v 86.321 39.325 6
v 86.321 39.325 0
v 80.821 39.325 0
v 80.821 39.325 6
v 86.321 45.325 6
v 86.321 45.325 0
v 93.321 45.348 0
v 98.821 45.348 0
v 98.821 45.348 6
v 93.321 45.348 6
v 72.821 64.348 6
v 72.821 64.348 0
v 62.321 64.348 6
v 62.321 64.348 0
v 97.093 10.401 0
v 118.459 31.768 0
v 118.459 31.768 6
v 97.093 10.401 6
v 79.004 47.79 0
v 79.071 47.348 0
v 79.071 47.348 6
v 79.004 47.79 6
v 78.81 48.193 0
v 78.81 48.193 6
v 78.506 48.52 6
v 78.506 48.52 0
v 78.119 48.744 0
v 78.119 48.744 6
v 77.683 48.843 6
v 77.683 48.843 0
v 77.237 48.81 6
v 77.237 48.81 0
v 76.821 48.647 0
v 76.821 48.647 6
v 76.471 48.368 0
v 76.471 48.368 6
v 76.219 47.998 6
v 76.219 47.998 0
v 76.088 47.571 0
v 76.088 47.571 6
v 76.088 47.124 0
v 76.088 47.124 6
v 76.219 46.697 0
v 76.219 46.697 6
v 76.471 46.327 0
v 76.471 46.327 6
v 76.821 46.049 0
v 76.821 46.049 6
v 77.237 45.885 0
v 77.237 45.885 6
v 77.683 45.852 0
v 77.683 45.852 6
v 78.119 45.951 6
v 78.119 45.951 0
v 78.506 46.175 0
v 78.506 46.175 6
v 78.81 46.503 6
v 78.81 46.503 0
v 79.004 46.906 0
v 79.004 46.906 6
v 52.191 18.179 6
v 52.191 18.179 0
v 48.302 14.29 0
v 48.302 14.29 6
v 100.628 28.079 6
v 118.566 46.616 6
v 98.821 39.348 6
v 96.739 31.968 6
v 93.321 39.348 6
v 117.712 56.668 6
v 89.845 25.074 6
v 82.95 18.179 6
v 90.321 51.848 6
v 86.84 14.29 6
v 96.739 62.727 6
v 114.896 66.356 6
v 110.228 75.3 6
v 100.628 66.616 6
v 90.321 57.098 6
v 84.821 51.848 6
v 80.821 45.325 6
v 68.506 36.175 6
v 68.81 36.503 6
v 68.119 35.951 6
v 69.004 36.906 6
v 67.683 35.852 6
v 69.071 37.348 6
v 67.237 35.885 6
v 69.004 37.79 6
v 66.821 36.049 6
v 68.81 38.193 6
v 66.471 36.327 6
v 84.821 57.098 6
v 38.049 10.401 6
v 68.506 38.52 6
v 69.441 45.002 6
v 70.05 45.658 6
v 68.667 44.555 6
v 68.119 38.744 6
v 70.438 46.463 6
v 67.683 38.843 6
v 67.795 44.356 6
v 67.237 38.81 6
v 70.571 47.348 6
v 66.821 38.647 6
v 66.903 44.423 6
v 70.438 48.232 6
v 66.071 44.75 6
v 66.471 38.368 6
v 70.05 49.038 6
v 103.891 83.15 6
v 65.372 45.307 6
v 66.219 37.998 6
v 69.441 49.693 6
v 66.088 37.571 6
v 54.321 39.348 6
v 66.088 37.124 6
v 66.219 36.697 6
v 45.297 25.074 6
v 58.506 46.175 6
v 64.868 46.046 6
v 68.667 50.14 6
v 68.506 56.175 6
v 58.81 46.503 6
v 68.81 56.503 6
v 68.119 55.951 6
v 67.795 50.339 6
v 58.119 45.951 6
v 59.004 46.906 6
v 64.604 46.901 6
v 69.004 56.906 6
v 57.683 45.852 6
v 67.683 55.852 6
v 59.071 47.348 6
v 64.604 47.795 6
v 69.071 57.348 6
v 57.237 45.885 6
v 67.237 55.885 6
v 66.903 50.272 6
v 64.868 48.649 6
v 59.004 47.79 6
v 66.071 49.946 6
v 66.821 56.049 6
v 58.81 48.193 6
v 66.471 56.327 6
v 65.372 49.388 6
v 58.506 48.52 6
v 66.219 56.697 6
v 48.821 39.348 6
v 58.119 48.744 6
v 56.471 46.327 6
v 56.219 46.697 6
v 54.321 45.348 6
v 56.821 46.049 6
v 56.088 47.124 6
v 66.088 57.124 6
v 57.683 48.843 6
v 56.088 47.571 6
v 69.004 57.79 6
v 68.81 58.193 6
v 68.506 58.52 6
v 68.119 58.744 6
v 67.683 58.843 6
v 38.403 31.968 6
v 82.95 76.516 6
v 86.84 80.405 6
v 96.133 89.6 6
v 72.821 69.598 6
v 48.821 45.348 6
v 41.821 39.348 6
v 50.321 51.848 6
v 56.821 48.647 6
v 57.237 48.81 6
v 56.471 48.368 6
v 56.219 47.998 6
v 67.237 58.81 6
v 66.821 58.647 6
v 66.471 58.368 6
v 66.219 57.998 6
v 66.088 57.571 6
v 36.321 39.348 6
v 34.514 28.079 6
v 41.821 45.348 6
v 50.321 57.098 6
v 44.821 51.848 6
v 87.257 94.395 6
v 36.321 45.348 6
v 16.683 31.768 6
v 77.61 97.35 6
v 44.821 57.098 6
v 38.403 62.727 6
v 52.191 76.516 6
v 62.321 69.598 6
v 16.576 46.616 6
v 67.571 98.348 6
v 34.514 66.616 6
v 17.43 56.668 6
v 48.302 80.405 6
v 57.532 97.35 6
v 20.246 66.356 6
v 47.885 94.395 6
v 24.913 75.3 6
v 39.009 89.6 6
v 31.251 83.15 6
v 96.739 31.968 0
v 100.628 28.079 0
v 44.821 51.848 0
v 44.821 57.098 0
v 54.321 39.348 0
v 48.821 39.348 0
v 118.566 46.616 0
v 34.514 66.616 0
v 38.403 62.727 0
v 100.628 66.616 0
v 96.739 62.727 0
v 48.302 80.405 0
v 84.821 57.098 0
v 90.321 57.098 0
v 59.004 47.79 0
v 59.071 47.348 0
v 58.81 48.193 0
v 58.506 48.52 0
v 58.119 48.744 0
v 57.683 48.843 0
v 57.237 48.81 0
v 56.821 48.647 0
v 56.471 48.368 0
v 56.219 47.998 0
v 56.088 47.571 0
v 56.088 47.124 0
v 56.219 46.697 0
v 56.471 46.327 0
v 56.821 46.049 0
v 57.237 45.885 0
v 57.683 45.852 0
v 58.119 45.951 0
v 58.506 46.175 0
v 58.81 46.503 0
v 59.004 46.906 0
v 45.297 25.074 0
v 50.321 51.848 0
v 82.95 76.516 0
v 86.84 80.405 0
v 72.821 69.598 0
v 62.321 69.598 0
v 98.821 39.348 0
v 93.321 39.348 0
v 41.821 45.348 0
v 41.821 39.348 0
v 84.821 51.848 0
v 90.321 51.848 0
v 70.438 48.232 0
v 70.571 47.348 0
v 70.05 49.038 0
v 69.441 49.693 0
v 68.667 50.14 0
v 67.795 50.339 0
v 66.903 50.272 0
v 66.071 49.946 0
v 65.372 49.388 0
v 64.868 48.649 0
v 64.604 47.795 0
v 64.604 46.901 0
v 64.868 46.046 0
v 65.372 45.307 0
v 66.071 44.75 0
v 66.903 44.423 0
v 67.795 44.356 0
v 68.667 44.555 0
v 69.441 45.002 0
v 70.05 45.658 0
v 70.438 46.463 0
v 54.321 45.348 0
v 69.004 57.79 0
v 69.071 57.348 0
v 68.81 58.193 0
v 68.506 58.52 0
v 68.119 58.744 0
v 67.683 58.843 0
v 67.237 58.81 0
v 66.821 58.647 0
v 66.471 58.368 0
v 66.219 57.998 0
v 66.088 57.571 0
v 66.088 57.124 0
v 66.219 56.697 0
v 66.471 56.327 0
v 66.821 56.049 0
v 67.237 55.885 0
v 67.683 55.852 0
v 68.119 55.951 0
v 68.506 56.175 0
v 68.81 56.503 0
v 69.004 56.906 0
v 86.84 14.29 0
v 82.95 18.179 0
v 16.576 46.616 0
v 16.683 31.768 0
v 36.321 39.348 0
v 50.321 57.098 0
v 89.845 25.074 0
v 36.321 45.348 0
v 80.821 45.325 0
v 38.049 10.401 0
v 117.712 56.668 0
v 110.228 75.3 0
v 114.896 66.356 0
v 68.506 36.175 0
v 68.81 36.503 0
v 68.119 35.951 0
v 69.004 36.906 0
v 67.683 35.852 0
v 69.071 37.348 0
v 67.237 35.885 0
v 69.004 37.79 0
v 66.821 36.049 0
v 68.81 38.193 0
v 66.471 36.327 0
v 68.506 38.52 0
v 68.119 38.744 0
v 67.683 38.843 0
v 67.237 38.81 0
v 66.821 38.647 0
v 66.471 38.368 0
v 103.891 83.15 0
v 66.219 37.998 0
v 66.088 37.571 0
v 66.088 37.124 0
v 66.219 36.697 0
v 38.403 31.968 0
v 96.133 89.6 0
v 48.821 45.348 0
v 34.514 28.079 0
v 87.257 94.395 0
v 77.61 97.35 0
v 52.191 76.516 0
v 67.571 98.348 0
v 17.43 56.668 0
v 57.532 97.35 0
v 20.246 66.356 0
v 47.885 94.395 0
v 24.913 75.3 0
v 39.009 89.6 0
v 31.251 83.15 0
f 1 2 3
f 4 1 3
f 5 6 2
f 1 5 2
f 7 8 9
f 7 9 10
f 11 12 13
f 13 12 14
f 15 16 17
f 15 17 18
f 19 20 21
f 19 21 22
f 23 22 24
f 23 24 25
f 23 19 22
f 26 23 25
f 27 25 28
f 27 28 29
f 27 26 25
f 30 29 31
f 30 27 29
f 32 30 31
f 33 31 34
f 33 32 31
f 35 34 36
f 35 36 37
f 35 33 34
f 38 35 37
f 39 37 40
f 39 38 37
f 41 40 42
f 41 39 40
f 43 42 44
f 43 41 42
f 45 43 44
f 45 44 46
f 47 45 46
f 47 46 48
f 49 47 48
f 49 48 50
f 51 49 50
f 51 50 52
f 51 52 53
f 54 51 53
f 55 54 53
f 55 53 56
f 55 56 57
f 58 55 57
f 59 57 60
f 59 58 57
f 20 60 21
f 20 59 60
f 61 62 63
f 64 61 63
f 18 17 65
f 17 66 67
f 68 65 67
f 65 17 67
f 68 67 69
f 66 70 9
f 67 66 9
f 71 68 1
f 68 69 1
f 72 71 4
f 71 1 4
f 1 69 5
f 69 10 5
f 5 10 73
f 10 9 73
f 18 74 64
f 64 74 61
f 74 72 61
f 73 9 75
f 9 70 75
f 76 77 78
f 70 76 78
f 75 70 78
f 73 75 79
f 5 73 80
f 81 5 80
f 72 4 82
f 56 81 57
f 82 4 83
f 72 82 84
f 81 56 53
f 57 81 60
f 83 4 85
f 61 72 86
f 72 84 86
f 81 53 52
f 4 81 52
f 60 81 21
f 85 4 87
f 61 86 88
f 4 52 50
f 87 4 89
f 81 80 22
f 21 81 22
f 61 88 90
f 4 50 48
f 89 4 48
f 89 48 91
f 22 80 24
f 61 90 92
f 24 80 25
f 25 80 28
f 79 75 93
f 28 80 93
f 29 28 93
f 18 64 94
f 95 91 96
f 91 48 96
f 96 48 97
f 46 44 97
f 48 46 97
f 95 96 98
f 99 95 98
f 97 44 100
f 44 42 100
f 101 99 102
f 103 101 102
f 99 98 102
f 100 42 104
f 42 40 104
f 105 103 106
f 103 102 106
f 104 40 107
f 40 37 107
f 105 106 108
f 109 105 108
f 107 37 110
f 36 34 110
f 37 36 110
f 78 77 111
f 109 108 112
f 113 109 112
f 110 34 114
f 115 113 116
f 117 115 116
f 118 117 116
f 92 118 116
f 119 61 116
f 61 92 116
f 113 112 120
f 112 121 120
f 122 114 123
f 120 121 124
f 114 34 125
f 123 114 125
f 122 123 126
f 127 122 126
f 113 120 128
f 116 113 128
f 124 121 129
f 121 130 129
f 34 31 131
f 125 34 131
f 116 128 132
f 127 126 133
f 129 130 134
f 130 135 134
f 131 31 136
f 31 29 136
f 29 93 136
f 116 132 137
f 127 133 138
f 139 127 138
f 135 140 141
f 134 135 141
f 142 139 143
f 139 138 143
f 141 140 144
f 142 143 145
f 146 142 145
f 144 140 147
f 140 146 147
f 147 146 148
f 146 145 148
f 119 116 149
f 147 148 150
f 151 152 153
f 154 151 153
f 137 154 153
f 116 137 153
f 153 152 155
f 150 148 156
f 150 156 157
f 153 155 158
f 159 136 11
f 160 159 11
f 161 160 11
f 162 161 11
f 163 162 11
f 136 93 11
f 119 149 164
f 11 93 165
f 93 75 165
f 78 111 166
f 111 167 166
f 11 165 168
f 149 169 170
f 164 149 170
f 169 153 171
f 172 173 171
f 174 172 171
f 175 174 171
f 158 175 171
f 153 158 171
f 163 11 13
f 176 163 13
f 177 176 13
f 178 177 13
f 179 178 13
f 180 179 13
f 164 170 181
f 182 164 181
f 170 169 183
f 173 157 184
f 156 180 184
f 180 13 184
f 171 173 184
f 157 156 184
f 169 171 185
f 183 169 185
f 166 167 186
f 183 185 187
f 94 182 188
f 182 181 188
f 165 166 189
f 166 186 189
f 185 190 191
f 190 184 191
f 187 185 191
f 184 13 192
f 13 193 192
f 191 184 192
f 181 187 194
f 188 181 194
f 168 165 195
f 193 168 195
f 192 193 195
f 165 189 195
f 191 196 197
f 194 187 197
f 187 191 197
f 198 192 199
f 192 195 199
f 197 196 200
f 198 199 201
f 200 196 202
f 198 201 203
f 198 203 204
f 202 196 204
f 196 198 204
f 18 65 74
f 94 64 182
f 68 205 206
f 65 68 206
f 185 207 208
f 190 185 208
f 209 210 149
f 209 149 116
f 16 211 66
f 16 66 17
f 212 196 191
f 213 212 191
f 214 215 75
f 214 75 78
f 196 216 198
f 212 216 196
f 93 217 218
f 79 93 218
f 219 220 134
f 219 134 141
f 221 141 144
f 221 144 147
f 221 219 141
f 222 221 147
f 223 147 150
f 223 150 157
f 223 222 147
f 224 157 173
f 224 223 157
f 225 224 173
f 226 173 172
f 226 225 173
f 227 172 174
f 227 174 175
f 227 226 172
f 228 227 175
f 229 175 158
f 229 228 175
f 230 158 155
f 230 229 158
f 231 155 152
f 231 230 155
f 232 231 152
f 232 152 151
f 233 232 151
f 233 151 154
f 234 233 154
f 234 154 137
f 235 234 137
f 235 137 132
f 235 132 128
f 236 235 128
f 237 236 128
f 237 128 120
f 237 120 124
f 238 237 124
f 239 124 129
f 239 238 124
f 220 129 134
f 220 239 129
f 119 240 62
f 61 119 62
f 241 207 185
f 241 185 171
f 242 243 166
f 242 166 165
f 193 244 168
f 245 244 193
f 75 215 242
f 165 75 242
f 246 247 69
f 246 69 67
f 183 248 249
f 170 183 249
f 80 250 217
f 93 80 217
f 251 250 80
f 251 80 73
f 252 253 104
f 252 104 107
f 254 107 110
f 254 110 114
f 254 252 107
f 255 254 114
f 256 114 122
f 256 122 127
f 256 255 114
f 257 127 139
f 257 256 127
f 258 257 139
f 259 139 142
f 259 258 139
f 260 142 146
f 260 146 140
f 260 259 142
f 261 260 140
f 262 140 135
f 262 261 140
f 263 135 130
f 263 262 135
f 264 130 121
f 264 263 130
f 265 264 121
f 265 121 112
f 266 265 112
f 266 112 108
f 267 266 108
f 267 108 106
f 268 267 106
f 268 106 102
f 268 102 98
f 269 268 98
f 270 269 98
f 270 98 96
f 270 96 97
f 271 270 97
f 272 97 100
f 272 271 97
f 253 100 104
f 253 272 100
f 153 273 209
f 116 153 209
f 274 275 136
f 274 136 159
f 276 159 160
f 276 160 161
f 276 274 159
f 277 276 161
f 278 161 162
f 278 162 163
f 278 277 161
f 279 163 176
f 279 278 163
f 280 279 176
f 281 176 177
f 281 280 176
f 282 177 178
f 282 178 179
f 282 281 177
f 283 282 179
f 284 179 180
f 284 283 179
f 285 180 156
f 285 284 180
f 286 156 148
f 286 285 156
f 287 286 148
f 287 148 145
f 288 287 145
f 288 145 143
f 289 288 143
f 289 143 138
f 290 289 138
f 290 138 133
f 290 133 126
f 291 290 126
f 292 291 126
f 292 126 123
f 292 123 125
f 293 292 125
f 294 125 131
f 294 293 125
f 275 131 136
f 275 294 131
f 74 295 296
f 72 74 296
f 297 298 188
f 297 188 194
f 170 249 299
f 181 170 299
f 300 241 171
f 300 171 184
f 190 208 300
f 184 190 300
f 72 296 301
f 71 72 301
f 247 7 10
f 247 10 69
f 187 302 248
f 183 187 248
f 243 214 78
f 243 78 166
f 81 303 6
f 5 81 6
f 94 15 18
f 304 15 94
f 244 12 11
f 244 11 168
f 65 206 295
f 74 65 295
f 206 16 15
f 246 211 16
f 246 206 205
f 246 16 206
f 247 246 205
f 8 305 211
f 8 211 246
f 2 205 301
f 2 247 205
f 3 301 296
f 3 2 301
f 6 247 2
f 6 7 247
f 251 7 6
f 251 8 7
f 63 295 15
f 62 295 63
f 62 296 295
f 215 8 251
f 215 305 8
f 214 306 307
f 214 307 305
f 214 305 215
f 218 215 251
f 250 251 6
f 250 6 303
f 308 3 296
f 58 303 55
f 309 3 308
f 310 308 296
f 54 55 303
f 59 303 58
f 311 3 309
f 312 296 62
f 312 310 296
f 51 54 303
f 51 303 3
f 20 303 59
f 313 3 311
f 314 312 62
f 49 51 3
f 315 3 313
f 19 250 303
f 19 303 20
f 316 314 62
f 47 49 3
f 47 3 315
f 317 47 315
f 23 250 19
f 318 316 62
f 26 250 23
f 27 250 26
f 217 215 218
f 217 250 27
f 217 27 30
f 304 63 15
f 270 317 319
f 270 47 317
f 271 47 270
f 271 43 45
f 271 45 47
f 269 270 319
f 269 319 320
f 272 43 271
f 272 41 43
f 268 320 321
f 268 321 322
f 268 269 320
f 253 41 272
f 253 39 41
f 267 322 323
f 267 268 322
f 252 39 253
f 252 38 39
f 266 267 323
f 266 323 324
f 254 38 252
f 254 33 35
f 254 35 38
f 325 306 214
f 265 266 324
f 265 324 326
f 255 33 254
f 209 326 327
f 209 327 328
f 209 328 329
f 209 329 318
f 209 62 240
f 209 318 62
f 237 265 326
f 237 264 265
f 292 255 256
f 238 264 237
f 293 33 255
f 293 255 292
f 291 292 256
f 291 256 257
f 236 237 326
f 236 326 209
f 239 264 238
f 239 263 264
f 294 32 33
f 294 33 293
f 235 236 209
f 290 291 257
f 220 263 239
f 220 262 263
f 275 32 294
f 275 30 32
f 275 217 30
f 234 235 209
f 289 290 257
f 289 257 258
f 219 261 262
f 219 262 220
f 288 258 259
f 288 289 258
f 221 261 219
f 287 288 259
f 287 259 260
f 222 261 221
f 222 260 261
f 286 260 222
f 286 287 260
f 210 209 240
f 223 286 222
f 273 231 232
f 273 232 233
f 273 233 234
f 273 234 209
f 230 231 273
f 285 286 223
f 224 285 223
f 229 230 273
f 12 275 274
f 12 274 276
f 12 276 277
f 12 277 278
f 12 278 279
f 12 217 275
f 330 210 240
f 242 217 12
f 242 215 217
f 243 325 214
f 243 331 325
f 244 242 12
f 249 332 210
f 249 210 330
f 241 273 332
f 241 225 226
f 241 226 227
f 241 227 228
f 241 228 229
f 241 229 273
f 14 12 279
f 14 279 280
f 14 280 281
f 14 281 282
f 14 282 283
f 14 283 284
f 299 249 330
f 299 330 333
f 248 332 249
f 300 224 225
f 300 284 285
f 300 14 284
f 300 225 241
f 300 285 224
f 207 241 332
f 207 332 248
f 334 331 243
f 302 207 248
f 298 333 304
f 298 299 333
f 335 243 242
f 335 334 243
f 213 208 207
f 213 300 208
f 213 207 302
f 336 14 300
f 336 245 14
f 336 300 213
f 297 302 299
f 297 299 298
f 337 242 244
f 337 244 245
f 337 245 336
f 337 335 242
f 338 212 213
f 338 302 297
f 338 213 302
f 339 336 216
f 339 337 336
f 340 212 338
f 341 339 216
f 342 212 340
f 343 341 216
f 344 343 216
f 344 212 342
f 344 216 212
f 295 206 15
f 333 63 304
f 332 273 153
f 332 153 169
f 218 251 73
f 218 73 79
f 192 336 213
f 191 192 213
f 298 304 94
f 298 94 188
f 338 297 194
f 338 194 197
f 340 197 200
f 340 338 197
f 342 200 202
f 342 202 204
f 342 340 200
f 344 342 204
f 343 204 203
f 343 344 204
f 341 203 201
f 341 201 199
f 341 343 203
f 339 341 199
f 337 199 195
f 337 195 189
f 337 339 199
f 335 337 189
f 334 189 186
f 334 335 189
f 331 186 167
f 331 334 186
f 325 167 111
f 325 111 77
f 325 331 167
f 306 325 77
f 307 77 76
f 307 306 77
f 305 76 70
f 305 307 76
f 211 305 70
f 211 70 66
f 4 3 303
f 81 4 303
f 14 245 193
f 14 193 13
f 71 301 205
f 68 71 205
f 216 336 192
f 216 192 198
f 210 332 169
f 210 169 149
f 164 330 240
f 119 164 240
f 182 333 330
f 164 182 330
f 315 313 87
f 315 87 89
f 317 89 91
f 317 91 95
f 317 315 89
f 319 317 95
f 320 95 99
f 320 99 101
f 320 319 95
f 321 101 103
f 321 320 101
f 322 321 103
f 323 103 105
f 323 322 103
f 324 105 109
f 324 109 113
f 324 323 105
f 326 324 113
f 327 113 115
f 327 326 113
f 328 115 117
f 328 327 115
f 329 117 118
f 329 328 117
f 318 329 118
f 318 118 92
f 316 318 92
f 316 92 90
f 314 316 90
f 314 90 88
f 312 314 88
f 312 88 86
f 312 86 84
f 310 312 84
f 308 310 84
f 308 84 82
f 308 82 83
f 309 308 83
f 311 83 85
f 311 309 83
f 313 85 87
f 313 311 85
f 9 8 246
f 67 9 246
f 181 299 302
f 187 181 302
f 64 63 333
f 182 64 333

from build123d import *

# Parameters (mm, degrees)
MODEL_R             = 3
MODEL_R_2           = 1.5
MODEL_W             = 5.5
MODEL_H             = 5.25
BOSS_EXTRUDE1_DEPTH = 6


with BuildPart() as part:
    # Model → Boss-Extrude1 (new body)
    with BuildSketch(Plane.XY):
        with BuildLine():
            Line((97.092556574, 10.401311798), (38.049140345, 10.401311798))
            Line((38.049140345, 10.401311798), (16.682633066, 31.767819077))
            Line((16.682633066, 31.767819077), (16.576099155, 46.615832828))
            ThreePointArc((16.576099155, 46.615832828), (67.57084846, 98.347641115), (118.565597764, 46.615832828))
            Line((118.565597764, 46.615832828), (118.459063854, 31.767819077))
            Line((118.459063854, 31.767819077), (97.092556574, 10.401311798))
        make_face()
        with Locations((67.57084846, 47.347641115)):
            Circle(MODEL_R, mode=Mode.SUBTRACT)
        with Locations((67.57084846, 57.347641115)):
            Circle(MODEL_R_2, mode=Mode.SUBTRACT)
        with Locations((77.57084846, 47.347641115)):
            Circle(MODEL_R_2, mode=Mode.SUBTRACT)
        with Locations((67.57084846, 37.347641115)):
            Circle(MODEL_R_2, mode=Mode.SUBTRACT)
        with Locations((57.57084846, 47.347641115)):
            Circle(MODEL_R_2, mode=Mode.SUBTRACT)
        Polygon((45.296984853, 69.621504723), (52.191275969, 76.515795839), (48.302188673, 80.404883136), (34.513606439, 66.616300902), (38.402693736, 62.727213606), align=None, mode=Mode.SUBTRACT)
        Polygon((45.296984853, 25.073777508), (52.191275969, 18.179486391), (48.302188673, 14.290399095), (34.513606439, 28.078981328), (38.402693736, 31.968068624), align=None, mode=Mode.SUBTRACT)
        Polygon((89.844712067, 69.621504723), (96.739003184, 62.727213606), (100.62809048, 66.616300902), (86.839508247, 80.404883136), (82.950420951, 76.515795839), align=None, mode=Mode.SUBTRACT)
        Polygon((89.844712067, 25.073777508), (96.739003184, 31.968068624), (100.62809048, 28.078981328), (86.839508247, 14.290399095), (82.950420951, 18.179486391), align=None, mode=Mode.SUBTRACT)
        Polygon((67.57084846, 64.347641115), (72.82084846, 64.347641115), (72.82084846, 69.597641115), (62.32084846, 69.597641115), (62.32084846, 64.347641115), align=None, mode=Mode.SUBTRACT)
        Polygon((36.32084846, 42.347641115), (36.32084846, 45.347641115), (41.82084846, 45.347641115), (41.82084846, 39.347641115), (36.32084846, 39.347641115), align=None, mode=Mode.SUBTRACT)
        Polygon((54.32084846, 42.347641115), (54.32084846, 45.347641115), (48.82084846, 45.347641115), (48.82084846, 39.347641115), (54.32084846, 39.347641115), align=None, mode=Mode.SUBTRACT)
        with Locations((47.57084846, 54.472641115)):
            Rectangle(MODEL_W, MODEL_H, mode=Mode.SUBTRACT)
        Polygon((98.82084846, 42.347641115), (98.82084846, 45.347641115), (93.32084846, 45.347641115), (93.32084846, 39.347641115), (98.82084846, 39.347641115), align=None, mode=Mode.SUBTRACT)
        Polygon((80.82136419, 42.324937285), (80.82136419, 45.324937285), (86.32136419, 45.324937285), (86.32136419, 39.324937285), (80.82136419, 39.324937285), align=None, mode=Mode.SUBTRACT)
        with Locations((87.57084846, 54.472641115)):
            Rectangle(MODEL_W, MODEL_H, mode=Mode.SUBTRACT)
    extrude(amount=BOSS_EXTRUDE1_DEPTH)


solid = part.part
